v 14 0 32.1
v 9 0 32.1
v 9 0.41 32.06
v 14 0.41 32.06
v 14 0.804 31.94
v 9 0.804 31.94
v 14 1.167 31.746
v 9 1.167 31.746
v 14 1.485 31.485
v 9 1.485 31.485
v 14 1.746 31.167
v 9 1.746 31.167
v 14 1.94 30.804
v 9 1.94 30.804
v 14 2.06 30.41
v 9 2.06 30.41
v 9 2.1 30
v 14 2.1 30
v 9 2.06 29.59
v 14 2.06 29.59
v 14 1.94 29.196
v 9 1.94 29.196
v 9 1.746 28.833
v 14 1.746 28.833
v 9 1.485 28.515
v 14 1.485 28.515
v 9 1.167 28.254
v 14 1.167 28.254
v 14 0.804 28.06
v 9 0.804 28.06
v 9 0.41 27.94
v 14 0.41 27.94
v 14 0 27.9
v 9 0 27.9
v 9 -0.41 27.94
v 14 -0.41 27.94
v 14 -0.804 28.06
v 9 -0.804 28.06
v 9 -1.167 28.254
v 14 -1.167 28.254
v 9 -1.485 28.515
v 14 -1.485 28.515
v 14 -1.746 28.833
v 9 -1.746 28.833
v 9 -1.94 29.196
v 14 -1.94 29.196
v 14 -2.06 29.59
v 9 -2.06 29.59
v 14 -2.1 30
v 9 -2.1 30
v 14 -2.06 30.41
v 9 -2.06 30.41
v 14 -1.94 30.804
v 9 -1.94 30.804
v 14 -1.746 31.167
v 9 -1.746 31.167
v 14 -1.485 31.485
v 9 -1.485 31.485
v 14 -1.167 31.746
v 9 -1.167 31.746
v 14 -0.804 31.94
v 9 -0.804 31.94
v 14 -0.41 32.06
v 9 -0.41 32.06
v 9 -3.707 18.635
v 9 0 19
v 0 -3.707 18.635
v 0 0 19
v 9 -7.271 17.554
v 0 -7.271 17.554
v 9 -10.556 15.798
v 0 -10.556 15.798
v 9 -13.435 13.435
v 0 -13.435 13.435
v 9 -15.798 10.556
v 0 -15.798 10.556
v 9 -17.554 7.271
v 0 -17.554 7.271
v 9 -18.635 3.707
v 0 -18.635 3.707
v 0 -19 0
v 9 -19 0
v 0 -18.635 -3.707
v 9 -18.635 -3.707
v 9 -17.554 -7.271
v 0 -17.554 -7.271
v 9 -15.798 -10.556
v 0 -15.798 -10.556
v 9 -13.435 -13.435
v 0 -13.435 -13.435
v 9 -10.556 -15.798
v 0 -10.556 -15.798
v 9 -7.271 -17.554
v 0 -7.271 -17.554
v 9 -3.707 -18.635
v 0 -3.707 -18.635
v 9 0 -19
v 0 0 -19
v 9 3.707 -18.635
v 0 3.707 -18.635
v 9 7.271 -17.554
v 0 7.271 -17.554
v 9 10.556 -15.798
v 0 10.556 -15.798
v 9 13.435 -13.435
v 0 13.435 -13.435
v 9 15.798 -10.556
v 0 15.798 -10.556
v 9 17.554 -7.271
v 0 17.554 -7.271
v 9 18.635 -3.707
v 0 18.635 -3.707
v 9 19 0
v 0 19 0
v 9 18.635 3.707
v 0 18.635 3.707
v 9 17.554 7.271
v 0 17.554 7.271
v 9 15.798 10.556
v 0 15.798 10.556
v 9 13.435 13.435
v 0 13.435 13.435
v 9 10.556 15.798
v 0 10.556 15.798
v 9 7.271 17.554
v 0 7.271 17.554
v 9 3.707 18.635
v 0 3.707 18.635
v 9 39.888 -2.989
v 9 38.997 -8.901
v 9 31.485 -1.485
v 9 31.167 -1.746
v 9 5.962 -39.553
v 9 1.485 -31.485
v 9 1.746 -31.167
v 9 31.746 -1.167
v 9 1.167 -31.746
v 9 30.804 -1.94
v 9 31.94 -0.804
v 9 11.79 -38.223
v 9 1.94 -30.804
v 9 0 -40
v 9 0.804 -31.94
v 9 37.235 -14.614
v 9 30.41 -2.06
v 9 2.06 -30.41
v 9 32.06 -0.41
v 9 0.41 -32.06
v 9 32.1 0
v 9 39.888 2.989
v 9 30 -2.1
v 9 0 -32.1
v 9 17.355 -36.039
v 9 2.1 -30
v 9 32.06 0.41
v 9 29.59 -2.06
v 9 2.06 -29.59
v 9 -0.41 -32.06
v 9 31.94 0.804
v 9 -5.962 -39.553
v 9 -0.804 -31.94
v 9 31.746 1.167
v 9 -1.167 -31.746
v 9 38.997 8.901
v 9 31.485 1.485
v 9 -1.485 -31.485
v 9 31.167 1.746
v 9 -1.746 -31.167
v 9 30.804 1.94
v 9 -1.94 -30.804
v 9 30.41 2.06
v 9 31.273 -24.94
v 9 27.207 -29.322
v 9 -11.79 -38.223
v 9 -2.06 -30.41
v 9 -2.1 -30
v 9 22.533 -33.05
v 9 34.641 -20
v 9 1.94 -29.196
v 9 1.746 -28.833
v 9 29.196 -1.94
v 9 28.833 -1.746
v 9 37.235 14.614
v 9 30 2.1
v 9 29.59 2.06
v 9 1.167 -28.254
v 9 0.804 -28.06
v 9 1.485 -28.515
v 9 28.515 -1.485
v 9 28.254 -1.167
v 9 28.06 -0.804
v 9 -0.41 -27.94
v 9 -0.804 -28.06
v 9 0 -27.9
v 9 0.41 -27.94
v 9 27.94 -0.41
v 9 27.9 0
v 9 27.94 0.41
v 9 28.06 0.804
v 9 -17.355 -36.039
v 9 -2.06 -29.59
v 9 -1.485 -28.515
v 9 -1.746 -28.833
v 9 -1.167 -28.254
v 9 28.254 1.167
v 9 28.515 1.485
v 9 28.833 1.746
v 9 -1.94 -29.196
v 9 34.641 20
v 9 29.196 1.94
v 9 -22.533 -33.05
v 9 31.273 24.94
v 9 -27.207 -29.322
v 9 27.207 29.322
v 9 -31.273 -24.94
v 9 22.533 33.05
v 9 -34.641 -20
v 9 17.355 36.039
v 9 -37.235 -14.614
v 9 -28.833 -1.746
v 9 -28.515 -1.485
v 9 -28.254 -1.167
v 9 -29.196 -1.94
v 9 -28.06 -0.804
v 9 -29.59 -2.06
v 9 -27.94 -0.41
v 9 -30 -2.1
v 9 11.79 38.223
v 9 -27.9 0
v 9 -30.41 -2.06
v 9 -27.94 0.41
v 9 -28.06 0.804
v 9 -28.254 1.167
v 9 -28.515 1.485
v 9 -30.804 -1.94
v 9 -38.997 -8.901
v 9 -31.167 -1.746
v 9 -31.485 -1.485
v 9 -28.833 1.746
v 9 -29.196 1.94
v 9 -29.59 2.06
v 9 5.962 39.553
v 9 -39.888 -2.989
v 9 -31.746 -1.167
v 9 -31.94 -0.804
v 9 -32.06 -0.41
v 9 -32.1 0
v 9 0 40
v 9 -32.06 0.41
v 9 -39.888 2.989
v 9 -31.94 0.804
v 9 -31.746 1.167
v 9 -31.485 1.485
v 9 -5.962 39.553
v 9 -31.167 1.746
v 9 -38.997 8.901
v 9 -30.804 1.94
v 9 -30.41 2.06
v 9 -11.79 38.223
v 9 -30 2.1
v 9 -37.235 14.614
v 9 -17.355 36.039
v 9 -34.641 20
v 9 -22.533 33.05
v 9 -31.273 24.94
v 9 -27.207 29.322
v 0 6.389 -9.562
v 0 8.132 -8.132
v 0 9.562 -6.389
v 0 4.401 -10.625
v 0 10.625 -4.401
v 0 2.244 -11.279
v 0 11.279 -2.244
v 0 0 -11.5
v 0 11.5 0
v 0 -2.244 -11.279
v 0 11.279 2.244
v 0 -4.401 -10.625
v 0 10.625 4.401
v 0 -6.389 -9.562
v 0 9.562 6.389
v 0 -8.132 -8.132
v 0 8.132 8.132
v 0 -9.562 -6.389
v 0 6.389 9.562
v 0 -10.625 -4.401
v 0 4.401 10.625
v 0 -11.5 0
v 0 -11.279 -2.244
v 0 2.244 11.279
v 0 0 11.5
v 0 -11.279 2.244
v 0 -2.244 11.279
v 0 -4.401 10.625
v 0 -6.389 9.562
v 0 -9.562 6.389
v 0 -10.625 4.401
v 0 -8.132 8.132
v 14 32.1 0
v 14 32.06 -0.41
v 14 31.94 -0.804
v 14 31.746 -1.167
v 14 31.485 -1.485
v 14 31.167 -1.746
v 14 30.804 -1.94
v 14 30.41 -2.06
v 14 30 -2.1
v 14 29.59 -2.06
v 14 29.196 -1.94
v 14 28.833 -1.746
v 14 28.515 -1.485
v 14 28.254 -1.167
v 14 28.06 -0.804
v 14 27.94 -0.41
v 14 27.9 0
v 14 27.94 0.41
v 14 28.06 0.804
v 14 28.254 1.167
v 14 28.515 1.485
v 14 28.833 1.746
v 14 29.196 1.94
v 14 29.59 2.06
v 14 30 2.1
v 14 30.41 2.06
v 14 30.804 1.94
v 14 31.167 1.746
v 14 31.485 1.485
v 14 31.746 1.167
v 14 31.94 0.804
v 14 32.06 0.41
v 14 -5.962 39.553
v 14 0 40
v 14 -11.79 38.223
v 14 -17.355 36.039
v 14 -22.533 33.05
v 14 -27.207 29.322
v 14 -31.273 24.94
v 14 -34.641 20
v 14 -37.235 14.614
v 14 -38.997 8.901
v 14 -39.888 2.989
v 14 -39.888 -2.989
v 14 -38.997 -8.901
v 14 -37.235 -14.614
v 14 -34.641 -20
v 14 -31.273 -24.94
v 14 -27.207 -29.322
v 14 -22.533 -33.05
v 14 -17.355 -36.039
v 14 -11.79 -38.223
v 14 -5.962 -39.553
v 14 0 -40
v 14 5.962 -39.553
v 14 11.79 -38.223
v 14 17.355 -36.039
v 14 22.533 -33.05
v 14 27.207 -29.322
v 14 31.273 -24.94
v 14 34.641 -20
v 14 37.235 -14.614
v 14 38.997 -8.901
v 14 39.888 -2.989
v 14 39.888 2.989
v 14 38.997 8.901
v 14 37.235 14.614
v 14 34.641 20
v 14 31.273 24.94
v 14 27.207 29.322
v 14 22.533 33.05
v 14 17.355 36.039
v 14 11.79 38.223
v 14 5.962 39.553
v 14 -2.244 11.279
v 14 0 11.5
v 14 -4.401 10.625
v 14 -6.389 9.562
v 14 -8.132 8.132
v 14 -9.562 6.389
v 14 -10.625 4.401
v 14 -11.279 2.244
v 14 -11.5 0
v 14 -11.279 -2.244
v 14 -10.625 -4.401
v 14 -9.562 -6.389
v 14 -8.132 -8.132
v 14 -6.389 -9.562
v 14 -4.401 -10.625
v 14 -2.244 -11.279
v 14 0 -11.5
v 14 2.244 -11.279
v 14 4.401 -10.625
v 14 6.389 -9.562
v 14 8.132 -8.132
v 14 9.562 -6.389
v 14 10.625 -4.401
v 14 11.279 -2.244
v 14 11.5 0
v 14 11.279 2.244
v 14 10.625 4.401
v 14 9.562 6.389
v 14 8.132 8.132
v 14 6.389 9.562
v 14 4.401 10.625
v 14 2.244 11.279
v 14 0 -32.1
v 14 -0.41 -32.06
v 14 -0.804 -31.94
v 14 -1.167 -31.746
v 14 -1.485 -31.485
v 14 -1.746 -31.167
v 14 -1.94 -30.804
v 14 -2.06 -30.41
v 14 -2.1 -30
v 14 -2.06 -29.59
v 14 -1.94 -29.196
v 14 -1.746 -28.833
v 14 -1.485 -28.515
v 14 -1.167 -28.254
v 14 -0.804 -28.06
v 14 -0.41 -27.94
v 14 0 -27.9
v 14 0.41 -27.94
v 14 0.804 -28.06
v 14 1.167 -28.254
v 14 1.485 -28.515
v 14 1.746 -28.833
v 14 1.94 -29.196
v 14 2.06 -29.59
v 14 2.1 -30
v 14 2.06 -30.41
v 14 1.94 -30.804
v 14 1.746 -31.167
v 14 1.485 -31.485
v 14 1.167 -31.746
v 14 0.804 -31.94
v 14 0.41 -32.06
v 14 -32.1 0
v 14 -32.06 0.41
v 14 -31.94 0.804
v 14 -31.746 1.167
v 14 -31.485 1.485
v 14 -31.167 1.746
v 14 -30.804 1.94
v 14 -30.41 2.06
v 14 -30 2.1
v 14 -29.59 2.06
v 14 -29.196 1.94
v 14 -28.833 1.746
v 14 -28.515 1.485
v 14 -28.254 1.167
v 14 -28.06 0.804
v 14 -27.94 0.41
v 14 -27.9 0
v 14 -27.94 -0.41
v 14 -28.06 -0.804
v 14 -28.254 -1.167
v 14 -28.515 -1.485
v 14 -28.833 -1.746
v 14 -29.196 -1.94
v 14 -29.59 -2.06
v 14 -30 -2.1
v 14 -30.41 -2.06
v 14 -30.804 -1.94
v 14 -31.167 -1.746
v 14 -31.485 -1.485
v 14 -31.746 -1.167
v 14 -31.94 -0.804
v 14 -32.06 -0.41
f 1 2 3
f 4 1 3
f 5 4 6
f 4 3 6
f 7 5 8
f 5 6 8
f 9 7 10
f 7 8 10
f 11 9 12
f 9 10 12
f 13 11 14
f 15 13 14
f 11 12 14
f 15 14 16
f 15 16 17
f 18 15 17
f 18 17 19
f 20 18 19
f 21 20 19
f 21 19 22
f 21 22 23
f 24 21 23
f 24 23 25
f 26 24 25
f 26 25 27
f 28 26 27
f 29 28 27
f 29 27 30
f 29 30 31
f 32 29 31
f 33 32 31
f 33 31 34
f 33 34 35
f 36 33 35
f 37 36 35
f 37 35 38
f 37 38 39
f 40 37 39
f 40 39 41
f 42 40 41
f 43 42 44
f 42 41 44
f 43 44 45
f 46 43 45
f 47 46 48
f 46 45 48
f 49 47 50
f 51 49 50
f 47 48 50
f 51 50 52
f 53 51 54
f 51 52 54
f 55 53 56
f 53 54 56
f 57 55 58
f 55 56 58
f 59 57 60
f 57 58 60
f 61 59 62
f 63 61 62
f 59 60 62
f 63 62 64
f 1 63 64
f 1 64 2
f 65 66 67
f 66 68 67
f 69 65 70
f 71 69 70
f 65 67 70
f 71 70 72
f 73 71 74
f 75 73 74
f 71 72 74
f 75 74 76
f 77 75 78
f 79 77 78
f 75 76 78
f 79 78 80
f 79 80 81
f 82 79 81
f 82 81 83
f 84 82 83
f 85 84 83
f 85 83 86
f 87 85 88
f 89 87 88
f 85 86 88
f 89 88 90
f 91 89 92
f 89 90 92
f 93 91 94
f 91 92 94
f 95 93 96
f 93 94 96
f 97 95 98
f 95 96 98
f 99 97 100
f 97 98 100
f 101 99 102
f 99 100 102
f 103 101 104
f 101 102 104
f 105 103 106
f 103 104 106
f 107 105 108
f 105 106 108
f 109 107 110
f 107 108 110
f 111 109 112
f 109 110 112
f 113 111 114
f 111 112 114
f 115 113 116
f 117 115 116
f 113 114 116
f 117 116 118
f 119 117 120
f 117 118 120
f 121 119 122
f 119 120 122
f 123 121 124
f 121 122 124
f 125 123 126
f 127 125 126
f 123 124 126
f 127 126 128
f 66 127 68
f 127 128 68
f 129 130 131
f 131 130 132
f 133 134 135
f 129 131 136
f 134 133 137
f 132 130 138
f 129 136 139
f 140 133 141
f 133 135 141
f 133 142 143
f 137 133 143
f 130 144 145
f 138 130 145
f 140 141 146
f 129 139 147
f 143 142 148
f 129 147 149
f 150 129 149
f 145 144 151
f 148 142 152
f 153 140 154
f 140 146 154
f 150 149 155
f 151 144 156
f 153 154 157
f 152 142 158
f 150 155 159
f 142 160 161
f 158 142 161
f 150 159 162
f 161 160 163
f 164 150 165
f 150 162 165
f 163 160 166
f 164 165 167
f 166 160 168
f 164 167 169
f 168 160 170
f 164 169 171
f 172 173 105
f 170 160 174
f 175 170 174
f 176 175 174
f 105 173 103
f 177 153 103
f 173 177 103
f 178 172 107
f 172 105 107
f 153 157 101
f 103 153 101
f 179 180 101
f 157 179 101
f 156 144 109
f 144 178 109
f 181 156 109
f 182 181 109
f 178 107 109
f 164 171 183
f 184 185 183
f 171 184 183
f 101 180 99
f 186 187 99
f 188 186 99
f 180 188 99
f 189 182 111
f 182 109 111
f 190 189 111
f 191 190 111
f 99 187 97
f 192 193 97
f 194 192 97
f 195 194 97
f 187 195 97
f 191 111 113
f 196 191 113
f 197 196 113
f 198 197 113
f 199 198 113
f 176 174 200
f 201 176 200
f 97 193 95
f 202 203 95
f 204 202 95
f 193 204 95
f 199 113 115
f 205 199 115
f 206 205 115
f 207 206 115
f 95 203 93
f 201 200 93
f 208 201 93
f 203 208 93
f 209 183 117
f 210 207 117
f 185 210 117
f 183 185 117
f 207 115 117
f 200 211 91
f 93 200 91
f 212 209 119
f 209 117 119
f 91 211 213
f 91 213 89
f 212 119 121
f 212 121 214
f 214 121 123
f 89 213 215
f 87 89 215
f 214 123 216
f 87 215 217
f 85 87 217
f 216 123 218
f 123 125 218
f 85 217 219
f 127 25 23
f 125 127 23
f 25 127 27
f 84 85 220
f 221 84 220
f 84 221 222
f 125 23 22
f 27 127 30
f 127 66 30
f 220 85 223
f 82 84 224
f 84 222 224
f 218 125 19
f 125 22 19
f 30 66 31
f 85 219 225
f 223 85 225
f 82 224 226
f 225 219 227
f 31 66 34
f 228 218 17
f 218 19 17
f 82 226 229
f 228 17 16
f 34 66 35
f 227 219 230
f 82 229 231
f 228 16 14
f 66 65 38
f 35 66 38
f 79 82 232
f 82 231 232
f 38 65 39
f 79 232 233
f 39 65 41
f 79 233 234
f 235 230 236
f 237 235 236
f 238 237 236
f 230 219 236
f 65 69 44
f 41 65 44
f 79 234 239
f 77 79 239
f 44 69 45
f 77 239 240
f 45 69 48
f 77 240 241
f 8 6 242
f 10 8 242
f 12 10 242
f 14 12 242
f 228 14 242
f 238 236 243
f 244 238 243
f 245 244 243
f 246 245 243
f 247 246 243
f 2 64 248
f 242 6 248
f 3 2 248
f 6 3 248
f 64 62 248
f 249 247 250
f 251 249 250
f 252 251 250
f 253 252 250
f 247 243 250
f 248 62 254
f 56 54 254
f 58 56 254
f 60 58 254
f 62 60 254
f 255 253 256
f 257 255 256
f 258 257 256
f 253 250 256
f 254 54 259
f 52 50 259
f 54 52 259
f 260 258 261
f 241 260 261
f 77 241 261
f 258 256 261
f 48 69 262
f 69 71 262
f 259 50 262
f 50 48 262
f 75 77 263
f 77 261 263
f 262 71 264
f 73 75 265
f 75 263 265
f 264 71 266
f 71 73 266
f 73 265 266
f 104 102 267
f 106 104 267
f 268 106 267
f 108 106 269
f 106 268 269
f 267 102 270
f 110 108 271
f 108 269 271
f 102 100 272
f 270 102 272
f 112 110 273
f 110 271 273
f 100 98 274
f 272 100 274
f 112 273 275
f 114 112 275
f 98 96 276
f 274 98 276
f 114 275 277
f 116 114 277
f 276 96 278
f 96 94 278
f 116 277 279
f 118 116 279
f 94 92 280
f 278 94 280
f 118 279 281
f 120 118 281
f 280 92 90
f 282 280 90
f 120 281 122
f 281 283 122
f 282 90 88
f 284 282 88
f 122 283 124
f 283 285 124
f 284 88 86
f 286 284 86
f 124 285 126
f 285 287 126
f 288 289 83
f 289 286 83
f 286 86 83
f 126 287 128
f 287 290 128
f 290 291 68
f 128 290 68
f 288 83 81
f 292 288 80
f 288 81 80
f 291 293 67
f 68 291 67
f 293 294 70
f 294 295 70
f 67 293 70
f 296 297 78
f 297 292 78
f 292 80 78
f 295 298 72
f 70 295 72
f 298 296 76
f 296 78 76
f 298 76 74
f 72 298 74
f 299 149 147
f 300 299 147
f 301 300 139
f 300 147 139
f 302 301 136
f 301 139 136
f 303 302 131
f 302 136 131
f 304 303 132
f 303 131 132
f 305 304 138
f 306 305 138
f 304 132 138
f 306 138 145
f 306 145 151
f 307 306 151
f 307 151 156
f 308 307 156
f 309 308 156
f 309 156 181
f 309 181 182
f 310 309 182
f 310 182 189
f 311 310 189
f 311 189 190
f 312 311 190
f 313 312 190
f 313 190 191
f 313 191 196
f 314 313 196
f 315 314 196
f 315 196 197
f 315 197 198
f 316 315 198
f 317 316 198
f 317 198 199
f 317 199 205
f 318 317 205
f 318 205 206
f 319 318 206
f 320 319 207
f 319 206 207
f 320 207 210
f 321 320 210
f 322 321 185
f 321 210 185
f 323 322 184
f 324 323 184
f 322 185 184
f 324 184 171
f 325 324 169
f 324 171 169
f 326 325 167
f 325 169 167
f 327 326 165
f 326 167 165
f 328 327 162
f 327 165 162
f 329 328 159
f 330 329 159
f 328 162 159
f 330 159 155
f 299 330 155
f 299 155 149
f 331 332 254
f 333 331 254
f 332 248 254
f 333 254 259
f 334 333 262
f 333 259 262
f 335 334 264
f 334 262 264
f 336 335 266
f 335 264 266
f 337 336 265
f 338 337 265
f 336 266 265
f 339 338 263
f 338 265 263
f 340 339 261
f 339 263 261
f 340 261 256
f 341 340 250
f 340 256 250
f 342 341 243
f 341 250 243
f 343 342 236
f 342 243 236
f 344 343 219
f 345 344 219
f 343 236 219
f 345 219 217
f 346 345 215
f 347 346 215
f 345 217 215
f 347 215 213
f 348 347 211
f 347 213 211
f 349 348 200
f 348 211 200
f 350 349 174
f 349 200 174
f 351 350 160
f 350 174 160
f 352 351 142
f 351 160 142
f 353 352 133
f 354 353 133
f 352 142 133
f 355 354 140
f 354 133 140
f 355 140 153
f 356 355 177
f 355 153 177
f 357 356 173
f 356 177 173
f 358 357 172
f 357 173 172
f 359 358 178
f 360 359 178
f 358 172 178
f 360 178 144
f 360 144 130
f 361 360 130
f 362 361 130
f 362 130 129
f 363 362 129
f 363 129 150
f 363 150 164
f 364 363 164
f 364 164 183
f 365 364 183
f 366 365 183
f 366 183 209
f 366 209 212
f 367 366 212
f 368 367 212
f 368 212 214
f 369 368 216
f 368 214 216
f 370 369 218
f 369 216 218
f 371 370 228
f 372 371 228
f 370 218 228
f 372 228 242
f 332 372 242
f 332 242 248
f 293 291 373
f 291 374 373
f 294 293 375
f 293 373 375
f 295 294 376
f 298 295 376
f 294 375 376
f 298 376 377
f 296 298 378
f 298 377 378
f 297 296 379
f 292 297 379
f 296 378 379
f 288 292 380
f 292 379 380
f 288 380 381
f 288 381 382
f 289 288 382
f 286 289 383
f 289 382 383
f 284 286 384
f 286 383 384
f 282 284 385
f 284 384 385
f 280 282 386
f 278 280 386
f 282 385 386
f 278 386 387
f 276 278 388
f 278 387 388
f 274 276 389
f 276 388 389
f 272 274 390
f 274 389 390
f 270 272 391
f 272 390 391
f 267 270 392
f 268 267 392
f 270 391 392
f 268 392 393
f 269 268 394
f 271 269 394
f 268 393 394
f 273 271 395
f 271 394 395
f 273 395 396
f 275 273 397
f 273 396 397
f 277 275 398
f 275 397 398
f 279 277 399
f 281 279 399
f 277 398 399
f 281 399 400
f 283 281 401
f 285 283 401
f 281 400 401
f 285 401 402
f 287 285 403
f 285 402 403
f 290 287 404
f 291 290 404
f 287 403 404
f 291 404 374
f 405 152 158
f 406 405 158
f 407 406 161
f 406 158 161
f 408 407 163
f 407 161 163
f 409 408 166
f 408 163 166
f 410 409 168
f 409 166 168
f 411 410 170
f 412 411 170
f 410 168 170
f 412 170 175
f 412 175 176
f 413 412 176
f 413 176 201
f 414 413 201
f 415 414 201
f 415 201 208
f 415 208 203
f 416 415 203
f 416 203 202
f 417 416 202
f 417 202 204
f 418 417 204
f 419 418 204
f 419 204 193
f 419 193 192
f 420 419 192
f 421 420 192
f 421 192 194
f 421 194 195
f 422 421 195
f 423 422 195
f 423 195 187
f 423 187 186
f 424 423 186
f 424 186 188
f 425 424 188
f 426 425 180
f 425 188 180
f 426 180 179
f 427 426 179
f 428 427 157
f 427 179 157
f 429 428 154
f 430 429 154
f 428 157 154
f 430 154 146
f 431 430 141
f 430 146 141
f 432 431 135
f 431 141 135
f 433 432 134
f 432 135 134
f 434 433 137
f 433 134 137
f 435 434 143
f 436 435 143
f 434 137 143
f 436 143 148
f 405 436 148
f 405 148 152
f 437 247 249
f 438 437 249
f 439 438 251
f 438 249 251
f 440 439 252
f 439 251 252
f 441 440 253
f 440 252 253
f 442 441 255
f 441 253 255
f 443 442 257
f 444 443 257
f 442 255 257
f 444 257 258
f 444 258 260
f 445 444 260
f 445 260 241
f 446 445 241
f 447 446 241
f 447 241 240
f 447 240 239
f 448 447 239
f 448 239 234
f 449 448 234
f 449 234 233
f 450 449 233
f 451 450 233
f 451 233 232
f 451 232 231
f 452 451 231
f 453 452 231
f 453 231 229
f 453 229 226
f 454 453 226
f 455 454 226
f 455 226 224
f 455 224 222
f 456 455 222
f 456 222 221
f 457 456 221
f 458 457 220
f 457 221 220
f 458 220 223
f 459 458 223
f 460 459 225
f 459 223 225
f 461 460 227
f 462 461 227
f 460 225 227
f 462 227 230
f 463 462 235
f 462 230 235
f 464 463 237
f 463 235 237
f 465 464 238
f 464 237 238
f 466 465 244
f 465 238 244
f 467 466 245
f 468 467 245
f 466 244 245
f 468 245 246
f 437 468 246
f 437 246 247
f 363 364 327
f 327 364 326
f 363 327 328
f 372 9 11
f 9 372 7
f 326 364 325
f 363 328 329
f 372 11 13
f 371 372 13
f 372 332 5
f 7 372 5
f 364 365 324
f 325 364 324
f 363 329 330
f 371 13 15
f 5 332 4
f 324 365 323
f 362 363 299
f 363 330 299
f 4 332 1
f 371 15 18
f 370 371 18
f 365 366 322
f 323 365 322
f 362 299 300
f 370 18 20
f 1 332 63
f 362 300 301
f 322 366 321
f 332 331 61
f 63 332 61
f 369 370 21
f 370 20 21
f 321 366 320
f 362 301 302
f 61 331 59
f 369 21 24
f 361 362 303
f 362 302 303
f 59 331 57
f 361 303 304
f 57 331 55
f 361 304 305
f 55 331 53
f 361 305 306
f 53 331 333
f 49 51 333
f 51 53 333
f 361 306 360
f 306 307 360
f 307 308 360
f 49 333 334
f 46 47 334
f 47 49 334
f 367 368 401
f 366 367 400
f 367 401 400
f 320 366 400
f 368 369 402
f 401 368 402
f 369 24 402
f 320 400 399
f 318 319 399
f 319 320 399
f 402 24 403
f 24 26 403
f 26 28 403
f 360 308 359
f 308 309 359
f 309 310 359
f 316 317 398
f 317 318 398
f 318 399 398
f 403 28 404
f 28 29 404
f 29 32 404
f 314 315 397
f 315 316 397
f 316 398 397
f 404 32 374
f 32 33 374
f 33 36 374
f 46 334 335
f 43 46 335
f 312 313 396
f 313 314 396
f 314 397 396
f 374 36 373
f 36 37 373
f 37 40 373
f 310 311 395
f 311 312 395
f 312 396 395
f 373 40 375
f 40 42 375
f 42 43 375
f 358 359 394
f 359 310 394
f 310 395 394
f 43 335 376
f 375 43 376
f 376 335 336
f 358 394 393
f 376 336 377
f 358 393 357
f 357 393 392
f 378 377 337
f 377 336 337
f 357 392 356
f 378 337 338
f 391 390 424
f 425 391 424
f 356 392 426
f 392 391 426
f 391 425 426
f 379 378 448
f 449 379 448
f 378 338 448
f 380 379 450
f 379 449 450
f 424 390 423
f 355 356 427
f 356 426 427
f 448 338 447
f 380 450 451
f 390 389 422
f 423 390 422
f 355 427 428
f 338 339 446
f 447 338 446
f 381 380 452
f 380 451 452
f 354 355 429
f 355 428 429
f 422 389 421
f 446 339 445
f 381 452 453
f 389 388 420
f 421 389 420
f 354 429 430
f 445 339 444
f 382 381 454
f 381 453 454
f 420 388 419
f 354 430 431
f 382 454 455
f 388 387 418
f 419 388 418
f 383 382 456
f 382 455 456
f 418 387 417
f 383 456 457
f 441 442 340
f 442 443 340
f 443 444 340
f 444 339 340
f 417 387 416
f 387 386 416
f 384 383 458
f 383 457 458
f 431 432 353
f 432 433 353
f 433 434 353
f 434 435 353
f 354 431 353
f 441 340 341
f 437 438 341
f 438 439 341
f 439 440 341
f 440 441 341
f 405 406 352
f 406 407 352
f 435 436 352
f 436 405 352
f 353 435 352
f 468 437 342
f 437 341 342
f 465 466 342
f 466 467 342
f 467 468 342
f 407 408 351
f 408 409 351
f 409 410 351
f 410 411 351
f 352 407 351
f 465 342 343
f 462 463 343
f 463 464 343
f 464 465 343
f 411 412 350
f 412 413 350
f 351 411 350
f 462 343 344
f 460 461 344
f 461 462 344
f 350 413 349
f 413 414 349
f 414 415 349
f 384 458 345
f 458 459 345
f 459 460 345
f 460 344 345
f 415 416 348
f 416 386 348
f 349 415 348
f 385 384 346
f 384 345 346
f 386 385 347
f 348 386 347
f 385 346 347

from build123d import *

# Parameters (mm, degrees)
SKETCH001_R        = 2.1
HOLE_DEPTH         = 233.001
POLARPATTERN_COUNT = 4


with BuildPart() as part:
    # Sketch → Revolution (revolve)
    with BuildSketch(Plane.XZ):
        Polygon((0, 11.5), (14, 11.5), (14, 40), (9, 40), (9, 19), (0, 19), align=None)
    revolve(axis=Axis((0, 0, 0), (1, 0, 0)))

    # Sketch001 (on Face4 of Revolution) → Hole (cut, through all)
    with BuildSketch(Plane(origin=(9, 0, 0), x_dir=(0, 0, -1), z_dir=(-1, 0, 0))):
        with Locations((30, 0)):
            Circle(SKETCH001_R)
    hole = extrude(amount=-HOLE_DEPTH, mode=Mode.SUBTRACT)

    # PolarPattern: Hole ×4 about axis
    polarpattern_axis = Axis((9, 0, 0), (-1, 0, 0))
    for i in range(1, POLARPATTERN_COUNT):
        add(hole.rotate(polarpattern_axis, i * 360 / POLARPATTERN_COUNT), mode=Mode.SUBTRACT)


solid = part.part
